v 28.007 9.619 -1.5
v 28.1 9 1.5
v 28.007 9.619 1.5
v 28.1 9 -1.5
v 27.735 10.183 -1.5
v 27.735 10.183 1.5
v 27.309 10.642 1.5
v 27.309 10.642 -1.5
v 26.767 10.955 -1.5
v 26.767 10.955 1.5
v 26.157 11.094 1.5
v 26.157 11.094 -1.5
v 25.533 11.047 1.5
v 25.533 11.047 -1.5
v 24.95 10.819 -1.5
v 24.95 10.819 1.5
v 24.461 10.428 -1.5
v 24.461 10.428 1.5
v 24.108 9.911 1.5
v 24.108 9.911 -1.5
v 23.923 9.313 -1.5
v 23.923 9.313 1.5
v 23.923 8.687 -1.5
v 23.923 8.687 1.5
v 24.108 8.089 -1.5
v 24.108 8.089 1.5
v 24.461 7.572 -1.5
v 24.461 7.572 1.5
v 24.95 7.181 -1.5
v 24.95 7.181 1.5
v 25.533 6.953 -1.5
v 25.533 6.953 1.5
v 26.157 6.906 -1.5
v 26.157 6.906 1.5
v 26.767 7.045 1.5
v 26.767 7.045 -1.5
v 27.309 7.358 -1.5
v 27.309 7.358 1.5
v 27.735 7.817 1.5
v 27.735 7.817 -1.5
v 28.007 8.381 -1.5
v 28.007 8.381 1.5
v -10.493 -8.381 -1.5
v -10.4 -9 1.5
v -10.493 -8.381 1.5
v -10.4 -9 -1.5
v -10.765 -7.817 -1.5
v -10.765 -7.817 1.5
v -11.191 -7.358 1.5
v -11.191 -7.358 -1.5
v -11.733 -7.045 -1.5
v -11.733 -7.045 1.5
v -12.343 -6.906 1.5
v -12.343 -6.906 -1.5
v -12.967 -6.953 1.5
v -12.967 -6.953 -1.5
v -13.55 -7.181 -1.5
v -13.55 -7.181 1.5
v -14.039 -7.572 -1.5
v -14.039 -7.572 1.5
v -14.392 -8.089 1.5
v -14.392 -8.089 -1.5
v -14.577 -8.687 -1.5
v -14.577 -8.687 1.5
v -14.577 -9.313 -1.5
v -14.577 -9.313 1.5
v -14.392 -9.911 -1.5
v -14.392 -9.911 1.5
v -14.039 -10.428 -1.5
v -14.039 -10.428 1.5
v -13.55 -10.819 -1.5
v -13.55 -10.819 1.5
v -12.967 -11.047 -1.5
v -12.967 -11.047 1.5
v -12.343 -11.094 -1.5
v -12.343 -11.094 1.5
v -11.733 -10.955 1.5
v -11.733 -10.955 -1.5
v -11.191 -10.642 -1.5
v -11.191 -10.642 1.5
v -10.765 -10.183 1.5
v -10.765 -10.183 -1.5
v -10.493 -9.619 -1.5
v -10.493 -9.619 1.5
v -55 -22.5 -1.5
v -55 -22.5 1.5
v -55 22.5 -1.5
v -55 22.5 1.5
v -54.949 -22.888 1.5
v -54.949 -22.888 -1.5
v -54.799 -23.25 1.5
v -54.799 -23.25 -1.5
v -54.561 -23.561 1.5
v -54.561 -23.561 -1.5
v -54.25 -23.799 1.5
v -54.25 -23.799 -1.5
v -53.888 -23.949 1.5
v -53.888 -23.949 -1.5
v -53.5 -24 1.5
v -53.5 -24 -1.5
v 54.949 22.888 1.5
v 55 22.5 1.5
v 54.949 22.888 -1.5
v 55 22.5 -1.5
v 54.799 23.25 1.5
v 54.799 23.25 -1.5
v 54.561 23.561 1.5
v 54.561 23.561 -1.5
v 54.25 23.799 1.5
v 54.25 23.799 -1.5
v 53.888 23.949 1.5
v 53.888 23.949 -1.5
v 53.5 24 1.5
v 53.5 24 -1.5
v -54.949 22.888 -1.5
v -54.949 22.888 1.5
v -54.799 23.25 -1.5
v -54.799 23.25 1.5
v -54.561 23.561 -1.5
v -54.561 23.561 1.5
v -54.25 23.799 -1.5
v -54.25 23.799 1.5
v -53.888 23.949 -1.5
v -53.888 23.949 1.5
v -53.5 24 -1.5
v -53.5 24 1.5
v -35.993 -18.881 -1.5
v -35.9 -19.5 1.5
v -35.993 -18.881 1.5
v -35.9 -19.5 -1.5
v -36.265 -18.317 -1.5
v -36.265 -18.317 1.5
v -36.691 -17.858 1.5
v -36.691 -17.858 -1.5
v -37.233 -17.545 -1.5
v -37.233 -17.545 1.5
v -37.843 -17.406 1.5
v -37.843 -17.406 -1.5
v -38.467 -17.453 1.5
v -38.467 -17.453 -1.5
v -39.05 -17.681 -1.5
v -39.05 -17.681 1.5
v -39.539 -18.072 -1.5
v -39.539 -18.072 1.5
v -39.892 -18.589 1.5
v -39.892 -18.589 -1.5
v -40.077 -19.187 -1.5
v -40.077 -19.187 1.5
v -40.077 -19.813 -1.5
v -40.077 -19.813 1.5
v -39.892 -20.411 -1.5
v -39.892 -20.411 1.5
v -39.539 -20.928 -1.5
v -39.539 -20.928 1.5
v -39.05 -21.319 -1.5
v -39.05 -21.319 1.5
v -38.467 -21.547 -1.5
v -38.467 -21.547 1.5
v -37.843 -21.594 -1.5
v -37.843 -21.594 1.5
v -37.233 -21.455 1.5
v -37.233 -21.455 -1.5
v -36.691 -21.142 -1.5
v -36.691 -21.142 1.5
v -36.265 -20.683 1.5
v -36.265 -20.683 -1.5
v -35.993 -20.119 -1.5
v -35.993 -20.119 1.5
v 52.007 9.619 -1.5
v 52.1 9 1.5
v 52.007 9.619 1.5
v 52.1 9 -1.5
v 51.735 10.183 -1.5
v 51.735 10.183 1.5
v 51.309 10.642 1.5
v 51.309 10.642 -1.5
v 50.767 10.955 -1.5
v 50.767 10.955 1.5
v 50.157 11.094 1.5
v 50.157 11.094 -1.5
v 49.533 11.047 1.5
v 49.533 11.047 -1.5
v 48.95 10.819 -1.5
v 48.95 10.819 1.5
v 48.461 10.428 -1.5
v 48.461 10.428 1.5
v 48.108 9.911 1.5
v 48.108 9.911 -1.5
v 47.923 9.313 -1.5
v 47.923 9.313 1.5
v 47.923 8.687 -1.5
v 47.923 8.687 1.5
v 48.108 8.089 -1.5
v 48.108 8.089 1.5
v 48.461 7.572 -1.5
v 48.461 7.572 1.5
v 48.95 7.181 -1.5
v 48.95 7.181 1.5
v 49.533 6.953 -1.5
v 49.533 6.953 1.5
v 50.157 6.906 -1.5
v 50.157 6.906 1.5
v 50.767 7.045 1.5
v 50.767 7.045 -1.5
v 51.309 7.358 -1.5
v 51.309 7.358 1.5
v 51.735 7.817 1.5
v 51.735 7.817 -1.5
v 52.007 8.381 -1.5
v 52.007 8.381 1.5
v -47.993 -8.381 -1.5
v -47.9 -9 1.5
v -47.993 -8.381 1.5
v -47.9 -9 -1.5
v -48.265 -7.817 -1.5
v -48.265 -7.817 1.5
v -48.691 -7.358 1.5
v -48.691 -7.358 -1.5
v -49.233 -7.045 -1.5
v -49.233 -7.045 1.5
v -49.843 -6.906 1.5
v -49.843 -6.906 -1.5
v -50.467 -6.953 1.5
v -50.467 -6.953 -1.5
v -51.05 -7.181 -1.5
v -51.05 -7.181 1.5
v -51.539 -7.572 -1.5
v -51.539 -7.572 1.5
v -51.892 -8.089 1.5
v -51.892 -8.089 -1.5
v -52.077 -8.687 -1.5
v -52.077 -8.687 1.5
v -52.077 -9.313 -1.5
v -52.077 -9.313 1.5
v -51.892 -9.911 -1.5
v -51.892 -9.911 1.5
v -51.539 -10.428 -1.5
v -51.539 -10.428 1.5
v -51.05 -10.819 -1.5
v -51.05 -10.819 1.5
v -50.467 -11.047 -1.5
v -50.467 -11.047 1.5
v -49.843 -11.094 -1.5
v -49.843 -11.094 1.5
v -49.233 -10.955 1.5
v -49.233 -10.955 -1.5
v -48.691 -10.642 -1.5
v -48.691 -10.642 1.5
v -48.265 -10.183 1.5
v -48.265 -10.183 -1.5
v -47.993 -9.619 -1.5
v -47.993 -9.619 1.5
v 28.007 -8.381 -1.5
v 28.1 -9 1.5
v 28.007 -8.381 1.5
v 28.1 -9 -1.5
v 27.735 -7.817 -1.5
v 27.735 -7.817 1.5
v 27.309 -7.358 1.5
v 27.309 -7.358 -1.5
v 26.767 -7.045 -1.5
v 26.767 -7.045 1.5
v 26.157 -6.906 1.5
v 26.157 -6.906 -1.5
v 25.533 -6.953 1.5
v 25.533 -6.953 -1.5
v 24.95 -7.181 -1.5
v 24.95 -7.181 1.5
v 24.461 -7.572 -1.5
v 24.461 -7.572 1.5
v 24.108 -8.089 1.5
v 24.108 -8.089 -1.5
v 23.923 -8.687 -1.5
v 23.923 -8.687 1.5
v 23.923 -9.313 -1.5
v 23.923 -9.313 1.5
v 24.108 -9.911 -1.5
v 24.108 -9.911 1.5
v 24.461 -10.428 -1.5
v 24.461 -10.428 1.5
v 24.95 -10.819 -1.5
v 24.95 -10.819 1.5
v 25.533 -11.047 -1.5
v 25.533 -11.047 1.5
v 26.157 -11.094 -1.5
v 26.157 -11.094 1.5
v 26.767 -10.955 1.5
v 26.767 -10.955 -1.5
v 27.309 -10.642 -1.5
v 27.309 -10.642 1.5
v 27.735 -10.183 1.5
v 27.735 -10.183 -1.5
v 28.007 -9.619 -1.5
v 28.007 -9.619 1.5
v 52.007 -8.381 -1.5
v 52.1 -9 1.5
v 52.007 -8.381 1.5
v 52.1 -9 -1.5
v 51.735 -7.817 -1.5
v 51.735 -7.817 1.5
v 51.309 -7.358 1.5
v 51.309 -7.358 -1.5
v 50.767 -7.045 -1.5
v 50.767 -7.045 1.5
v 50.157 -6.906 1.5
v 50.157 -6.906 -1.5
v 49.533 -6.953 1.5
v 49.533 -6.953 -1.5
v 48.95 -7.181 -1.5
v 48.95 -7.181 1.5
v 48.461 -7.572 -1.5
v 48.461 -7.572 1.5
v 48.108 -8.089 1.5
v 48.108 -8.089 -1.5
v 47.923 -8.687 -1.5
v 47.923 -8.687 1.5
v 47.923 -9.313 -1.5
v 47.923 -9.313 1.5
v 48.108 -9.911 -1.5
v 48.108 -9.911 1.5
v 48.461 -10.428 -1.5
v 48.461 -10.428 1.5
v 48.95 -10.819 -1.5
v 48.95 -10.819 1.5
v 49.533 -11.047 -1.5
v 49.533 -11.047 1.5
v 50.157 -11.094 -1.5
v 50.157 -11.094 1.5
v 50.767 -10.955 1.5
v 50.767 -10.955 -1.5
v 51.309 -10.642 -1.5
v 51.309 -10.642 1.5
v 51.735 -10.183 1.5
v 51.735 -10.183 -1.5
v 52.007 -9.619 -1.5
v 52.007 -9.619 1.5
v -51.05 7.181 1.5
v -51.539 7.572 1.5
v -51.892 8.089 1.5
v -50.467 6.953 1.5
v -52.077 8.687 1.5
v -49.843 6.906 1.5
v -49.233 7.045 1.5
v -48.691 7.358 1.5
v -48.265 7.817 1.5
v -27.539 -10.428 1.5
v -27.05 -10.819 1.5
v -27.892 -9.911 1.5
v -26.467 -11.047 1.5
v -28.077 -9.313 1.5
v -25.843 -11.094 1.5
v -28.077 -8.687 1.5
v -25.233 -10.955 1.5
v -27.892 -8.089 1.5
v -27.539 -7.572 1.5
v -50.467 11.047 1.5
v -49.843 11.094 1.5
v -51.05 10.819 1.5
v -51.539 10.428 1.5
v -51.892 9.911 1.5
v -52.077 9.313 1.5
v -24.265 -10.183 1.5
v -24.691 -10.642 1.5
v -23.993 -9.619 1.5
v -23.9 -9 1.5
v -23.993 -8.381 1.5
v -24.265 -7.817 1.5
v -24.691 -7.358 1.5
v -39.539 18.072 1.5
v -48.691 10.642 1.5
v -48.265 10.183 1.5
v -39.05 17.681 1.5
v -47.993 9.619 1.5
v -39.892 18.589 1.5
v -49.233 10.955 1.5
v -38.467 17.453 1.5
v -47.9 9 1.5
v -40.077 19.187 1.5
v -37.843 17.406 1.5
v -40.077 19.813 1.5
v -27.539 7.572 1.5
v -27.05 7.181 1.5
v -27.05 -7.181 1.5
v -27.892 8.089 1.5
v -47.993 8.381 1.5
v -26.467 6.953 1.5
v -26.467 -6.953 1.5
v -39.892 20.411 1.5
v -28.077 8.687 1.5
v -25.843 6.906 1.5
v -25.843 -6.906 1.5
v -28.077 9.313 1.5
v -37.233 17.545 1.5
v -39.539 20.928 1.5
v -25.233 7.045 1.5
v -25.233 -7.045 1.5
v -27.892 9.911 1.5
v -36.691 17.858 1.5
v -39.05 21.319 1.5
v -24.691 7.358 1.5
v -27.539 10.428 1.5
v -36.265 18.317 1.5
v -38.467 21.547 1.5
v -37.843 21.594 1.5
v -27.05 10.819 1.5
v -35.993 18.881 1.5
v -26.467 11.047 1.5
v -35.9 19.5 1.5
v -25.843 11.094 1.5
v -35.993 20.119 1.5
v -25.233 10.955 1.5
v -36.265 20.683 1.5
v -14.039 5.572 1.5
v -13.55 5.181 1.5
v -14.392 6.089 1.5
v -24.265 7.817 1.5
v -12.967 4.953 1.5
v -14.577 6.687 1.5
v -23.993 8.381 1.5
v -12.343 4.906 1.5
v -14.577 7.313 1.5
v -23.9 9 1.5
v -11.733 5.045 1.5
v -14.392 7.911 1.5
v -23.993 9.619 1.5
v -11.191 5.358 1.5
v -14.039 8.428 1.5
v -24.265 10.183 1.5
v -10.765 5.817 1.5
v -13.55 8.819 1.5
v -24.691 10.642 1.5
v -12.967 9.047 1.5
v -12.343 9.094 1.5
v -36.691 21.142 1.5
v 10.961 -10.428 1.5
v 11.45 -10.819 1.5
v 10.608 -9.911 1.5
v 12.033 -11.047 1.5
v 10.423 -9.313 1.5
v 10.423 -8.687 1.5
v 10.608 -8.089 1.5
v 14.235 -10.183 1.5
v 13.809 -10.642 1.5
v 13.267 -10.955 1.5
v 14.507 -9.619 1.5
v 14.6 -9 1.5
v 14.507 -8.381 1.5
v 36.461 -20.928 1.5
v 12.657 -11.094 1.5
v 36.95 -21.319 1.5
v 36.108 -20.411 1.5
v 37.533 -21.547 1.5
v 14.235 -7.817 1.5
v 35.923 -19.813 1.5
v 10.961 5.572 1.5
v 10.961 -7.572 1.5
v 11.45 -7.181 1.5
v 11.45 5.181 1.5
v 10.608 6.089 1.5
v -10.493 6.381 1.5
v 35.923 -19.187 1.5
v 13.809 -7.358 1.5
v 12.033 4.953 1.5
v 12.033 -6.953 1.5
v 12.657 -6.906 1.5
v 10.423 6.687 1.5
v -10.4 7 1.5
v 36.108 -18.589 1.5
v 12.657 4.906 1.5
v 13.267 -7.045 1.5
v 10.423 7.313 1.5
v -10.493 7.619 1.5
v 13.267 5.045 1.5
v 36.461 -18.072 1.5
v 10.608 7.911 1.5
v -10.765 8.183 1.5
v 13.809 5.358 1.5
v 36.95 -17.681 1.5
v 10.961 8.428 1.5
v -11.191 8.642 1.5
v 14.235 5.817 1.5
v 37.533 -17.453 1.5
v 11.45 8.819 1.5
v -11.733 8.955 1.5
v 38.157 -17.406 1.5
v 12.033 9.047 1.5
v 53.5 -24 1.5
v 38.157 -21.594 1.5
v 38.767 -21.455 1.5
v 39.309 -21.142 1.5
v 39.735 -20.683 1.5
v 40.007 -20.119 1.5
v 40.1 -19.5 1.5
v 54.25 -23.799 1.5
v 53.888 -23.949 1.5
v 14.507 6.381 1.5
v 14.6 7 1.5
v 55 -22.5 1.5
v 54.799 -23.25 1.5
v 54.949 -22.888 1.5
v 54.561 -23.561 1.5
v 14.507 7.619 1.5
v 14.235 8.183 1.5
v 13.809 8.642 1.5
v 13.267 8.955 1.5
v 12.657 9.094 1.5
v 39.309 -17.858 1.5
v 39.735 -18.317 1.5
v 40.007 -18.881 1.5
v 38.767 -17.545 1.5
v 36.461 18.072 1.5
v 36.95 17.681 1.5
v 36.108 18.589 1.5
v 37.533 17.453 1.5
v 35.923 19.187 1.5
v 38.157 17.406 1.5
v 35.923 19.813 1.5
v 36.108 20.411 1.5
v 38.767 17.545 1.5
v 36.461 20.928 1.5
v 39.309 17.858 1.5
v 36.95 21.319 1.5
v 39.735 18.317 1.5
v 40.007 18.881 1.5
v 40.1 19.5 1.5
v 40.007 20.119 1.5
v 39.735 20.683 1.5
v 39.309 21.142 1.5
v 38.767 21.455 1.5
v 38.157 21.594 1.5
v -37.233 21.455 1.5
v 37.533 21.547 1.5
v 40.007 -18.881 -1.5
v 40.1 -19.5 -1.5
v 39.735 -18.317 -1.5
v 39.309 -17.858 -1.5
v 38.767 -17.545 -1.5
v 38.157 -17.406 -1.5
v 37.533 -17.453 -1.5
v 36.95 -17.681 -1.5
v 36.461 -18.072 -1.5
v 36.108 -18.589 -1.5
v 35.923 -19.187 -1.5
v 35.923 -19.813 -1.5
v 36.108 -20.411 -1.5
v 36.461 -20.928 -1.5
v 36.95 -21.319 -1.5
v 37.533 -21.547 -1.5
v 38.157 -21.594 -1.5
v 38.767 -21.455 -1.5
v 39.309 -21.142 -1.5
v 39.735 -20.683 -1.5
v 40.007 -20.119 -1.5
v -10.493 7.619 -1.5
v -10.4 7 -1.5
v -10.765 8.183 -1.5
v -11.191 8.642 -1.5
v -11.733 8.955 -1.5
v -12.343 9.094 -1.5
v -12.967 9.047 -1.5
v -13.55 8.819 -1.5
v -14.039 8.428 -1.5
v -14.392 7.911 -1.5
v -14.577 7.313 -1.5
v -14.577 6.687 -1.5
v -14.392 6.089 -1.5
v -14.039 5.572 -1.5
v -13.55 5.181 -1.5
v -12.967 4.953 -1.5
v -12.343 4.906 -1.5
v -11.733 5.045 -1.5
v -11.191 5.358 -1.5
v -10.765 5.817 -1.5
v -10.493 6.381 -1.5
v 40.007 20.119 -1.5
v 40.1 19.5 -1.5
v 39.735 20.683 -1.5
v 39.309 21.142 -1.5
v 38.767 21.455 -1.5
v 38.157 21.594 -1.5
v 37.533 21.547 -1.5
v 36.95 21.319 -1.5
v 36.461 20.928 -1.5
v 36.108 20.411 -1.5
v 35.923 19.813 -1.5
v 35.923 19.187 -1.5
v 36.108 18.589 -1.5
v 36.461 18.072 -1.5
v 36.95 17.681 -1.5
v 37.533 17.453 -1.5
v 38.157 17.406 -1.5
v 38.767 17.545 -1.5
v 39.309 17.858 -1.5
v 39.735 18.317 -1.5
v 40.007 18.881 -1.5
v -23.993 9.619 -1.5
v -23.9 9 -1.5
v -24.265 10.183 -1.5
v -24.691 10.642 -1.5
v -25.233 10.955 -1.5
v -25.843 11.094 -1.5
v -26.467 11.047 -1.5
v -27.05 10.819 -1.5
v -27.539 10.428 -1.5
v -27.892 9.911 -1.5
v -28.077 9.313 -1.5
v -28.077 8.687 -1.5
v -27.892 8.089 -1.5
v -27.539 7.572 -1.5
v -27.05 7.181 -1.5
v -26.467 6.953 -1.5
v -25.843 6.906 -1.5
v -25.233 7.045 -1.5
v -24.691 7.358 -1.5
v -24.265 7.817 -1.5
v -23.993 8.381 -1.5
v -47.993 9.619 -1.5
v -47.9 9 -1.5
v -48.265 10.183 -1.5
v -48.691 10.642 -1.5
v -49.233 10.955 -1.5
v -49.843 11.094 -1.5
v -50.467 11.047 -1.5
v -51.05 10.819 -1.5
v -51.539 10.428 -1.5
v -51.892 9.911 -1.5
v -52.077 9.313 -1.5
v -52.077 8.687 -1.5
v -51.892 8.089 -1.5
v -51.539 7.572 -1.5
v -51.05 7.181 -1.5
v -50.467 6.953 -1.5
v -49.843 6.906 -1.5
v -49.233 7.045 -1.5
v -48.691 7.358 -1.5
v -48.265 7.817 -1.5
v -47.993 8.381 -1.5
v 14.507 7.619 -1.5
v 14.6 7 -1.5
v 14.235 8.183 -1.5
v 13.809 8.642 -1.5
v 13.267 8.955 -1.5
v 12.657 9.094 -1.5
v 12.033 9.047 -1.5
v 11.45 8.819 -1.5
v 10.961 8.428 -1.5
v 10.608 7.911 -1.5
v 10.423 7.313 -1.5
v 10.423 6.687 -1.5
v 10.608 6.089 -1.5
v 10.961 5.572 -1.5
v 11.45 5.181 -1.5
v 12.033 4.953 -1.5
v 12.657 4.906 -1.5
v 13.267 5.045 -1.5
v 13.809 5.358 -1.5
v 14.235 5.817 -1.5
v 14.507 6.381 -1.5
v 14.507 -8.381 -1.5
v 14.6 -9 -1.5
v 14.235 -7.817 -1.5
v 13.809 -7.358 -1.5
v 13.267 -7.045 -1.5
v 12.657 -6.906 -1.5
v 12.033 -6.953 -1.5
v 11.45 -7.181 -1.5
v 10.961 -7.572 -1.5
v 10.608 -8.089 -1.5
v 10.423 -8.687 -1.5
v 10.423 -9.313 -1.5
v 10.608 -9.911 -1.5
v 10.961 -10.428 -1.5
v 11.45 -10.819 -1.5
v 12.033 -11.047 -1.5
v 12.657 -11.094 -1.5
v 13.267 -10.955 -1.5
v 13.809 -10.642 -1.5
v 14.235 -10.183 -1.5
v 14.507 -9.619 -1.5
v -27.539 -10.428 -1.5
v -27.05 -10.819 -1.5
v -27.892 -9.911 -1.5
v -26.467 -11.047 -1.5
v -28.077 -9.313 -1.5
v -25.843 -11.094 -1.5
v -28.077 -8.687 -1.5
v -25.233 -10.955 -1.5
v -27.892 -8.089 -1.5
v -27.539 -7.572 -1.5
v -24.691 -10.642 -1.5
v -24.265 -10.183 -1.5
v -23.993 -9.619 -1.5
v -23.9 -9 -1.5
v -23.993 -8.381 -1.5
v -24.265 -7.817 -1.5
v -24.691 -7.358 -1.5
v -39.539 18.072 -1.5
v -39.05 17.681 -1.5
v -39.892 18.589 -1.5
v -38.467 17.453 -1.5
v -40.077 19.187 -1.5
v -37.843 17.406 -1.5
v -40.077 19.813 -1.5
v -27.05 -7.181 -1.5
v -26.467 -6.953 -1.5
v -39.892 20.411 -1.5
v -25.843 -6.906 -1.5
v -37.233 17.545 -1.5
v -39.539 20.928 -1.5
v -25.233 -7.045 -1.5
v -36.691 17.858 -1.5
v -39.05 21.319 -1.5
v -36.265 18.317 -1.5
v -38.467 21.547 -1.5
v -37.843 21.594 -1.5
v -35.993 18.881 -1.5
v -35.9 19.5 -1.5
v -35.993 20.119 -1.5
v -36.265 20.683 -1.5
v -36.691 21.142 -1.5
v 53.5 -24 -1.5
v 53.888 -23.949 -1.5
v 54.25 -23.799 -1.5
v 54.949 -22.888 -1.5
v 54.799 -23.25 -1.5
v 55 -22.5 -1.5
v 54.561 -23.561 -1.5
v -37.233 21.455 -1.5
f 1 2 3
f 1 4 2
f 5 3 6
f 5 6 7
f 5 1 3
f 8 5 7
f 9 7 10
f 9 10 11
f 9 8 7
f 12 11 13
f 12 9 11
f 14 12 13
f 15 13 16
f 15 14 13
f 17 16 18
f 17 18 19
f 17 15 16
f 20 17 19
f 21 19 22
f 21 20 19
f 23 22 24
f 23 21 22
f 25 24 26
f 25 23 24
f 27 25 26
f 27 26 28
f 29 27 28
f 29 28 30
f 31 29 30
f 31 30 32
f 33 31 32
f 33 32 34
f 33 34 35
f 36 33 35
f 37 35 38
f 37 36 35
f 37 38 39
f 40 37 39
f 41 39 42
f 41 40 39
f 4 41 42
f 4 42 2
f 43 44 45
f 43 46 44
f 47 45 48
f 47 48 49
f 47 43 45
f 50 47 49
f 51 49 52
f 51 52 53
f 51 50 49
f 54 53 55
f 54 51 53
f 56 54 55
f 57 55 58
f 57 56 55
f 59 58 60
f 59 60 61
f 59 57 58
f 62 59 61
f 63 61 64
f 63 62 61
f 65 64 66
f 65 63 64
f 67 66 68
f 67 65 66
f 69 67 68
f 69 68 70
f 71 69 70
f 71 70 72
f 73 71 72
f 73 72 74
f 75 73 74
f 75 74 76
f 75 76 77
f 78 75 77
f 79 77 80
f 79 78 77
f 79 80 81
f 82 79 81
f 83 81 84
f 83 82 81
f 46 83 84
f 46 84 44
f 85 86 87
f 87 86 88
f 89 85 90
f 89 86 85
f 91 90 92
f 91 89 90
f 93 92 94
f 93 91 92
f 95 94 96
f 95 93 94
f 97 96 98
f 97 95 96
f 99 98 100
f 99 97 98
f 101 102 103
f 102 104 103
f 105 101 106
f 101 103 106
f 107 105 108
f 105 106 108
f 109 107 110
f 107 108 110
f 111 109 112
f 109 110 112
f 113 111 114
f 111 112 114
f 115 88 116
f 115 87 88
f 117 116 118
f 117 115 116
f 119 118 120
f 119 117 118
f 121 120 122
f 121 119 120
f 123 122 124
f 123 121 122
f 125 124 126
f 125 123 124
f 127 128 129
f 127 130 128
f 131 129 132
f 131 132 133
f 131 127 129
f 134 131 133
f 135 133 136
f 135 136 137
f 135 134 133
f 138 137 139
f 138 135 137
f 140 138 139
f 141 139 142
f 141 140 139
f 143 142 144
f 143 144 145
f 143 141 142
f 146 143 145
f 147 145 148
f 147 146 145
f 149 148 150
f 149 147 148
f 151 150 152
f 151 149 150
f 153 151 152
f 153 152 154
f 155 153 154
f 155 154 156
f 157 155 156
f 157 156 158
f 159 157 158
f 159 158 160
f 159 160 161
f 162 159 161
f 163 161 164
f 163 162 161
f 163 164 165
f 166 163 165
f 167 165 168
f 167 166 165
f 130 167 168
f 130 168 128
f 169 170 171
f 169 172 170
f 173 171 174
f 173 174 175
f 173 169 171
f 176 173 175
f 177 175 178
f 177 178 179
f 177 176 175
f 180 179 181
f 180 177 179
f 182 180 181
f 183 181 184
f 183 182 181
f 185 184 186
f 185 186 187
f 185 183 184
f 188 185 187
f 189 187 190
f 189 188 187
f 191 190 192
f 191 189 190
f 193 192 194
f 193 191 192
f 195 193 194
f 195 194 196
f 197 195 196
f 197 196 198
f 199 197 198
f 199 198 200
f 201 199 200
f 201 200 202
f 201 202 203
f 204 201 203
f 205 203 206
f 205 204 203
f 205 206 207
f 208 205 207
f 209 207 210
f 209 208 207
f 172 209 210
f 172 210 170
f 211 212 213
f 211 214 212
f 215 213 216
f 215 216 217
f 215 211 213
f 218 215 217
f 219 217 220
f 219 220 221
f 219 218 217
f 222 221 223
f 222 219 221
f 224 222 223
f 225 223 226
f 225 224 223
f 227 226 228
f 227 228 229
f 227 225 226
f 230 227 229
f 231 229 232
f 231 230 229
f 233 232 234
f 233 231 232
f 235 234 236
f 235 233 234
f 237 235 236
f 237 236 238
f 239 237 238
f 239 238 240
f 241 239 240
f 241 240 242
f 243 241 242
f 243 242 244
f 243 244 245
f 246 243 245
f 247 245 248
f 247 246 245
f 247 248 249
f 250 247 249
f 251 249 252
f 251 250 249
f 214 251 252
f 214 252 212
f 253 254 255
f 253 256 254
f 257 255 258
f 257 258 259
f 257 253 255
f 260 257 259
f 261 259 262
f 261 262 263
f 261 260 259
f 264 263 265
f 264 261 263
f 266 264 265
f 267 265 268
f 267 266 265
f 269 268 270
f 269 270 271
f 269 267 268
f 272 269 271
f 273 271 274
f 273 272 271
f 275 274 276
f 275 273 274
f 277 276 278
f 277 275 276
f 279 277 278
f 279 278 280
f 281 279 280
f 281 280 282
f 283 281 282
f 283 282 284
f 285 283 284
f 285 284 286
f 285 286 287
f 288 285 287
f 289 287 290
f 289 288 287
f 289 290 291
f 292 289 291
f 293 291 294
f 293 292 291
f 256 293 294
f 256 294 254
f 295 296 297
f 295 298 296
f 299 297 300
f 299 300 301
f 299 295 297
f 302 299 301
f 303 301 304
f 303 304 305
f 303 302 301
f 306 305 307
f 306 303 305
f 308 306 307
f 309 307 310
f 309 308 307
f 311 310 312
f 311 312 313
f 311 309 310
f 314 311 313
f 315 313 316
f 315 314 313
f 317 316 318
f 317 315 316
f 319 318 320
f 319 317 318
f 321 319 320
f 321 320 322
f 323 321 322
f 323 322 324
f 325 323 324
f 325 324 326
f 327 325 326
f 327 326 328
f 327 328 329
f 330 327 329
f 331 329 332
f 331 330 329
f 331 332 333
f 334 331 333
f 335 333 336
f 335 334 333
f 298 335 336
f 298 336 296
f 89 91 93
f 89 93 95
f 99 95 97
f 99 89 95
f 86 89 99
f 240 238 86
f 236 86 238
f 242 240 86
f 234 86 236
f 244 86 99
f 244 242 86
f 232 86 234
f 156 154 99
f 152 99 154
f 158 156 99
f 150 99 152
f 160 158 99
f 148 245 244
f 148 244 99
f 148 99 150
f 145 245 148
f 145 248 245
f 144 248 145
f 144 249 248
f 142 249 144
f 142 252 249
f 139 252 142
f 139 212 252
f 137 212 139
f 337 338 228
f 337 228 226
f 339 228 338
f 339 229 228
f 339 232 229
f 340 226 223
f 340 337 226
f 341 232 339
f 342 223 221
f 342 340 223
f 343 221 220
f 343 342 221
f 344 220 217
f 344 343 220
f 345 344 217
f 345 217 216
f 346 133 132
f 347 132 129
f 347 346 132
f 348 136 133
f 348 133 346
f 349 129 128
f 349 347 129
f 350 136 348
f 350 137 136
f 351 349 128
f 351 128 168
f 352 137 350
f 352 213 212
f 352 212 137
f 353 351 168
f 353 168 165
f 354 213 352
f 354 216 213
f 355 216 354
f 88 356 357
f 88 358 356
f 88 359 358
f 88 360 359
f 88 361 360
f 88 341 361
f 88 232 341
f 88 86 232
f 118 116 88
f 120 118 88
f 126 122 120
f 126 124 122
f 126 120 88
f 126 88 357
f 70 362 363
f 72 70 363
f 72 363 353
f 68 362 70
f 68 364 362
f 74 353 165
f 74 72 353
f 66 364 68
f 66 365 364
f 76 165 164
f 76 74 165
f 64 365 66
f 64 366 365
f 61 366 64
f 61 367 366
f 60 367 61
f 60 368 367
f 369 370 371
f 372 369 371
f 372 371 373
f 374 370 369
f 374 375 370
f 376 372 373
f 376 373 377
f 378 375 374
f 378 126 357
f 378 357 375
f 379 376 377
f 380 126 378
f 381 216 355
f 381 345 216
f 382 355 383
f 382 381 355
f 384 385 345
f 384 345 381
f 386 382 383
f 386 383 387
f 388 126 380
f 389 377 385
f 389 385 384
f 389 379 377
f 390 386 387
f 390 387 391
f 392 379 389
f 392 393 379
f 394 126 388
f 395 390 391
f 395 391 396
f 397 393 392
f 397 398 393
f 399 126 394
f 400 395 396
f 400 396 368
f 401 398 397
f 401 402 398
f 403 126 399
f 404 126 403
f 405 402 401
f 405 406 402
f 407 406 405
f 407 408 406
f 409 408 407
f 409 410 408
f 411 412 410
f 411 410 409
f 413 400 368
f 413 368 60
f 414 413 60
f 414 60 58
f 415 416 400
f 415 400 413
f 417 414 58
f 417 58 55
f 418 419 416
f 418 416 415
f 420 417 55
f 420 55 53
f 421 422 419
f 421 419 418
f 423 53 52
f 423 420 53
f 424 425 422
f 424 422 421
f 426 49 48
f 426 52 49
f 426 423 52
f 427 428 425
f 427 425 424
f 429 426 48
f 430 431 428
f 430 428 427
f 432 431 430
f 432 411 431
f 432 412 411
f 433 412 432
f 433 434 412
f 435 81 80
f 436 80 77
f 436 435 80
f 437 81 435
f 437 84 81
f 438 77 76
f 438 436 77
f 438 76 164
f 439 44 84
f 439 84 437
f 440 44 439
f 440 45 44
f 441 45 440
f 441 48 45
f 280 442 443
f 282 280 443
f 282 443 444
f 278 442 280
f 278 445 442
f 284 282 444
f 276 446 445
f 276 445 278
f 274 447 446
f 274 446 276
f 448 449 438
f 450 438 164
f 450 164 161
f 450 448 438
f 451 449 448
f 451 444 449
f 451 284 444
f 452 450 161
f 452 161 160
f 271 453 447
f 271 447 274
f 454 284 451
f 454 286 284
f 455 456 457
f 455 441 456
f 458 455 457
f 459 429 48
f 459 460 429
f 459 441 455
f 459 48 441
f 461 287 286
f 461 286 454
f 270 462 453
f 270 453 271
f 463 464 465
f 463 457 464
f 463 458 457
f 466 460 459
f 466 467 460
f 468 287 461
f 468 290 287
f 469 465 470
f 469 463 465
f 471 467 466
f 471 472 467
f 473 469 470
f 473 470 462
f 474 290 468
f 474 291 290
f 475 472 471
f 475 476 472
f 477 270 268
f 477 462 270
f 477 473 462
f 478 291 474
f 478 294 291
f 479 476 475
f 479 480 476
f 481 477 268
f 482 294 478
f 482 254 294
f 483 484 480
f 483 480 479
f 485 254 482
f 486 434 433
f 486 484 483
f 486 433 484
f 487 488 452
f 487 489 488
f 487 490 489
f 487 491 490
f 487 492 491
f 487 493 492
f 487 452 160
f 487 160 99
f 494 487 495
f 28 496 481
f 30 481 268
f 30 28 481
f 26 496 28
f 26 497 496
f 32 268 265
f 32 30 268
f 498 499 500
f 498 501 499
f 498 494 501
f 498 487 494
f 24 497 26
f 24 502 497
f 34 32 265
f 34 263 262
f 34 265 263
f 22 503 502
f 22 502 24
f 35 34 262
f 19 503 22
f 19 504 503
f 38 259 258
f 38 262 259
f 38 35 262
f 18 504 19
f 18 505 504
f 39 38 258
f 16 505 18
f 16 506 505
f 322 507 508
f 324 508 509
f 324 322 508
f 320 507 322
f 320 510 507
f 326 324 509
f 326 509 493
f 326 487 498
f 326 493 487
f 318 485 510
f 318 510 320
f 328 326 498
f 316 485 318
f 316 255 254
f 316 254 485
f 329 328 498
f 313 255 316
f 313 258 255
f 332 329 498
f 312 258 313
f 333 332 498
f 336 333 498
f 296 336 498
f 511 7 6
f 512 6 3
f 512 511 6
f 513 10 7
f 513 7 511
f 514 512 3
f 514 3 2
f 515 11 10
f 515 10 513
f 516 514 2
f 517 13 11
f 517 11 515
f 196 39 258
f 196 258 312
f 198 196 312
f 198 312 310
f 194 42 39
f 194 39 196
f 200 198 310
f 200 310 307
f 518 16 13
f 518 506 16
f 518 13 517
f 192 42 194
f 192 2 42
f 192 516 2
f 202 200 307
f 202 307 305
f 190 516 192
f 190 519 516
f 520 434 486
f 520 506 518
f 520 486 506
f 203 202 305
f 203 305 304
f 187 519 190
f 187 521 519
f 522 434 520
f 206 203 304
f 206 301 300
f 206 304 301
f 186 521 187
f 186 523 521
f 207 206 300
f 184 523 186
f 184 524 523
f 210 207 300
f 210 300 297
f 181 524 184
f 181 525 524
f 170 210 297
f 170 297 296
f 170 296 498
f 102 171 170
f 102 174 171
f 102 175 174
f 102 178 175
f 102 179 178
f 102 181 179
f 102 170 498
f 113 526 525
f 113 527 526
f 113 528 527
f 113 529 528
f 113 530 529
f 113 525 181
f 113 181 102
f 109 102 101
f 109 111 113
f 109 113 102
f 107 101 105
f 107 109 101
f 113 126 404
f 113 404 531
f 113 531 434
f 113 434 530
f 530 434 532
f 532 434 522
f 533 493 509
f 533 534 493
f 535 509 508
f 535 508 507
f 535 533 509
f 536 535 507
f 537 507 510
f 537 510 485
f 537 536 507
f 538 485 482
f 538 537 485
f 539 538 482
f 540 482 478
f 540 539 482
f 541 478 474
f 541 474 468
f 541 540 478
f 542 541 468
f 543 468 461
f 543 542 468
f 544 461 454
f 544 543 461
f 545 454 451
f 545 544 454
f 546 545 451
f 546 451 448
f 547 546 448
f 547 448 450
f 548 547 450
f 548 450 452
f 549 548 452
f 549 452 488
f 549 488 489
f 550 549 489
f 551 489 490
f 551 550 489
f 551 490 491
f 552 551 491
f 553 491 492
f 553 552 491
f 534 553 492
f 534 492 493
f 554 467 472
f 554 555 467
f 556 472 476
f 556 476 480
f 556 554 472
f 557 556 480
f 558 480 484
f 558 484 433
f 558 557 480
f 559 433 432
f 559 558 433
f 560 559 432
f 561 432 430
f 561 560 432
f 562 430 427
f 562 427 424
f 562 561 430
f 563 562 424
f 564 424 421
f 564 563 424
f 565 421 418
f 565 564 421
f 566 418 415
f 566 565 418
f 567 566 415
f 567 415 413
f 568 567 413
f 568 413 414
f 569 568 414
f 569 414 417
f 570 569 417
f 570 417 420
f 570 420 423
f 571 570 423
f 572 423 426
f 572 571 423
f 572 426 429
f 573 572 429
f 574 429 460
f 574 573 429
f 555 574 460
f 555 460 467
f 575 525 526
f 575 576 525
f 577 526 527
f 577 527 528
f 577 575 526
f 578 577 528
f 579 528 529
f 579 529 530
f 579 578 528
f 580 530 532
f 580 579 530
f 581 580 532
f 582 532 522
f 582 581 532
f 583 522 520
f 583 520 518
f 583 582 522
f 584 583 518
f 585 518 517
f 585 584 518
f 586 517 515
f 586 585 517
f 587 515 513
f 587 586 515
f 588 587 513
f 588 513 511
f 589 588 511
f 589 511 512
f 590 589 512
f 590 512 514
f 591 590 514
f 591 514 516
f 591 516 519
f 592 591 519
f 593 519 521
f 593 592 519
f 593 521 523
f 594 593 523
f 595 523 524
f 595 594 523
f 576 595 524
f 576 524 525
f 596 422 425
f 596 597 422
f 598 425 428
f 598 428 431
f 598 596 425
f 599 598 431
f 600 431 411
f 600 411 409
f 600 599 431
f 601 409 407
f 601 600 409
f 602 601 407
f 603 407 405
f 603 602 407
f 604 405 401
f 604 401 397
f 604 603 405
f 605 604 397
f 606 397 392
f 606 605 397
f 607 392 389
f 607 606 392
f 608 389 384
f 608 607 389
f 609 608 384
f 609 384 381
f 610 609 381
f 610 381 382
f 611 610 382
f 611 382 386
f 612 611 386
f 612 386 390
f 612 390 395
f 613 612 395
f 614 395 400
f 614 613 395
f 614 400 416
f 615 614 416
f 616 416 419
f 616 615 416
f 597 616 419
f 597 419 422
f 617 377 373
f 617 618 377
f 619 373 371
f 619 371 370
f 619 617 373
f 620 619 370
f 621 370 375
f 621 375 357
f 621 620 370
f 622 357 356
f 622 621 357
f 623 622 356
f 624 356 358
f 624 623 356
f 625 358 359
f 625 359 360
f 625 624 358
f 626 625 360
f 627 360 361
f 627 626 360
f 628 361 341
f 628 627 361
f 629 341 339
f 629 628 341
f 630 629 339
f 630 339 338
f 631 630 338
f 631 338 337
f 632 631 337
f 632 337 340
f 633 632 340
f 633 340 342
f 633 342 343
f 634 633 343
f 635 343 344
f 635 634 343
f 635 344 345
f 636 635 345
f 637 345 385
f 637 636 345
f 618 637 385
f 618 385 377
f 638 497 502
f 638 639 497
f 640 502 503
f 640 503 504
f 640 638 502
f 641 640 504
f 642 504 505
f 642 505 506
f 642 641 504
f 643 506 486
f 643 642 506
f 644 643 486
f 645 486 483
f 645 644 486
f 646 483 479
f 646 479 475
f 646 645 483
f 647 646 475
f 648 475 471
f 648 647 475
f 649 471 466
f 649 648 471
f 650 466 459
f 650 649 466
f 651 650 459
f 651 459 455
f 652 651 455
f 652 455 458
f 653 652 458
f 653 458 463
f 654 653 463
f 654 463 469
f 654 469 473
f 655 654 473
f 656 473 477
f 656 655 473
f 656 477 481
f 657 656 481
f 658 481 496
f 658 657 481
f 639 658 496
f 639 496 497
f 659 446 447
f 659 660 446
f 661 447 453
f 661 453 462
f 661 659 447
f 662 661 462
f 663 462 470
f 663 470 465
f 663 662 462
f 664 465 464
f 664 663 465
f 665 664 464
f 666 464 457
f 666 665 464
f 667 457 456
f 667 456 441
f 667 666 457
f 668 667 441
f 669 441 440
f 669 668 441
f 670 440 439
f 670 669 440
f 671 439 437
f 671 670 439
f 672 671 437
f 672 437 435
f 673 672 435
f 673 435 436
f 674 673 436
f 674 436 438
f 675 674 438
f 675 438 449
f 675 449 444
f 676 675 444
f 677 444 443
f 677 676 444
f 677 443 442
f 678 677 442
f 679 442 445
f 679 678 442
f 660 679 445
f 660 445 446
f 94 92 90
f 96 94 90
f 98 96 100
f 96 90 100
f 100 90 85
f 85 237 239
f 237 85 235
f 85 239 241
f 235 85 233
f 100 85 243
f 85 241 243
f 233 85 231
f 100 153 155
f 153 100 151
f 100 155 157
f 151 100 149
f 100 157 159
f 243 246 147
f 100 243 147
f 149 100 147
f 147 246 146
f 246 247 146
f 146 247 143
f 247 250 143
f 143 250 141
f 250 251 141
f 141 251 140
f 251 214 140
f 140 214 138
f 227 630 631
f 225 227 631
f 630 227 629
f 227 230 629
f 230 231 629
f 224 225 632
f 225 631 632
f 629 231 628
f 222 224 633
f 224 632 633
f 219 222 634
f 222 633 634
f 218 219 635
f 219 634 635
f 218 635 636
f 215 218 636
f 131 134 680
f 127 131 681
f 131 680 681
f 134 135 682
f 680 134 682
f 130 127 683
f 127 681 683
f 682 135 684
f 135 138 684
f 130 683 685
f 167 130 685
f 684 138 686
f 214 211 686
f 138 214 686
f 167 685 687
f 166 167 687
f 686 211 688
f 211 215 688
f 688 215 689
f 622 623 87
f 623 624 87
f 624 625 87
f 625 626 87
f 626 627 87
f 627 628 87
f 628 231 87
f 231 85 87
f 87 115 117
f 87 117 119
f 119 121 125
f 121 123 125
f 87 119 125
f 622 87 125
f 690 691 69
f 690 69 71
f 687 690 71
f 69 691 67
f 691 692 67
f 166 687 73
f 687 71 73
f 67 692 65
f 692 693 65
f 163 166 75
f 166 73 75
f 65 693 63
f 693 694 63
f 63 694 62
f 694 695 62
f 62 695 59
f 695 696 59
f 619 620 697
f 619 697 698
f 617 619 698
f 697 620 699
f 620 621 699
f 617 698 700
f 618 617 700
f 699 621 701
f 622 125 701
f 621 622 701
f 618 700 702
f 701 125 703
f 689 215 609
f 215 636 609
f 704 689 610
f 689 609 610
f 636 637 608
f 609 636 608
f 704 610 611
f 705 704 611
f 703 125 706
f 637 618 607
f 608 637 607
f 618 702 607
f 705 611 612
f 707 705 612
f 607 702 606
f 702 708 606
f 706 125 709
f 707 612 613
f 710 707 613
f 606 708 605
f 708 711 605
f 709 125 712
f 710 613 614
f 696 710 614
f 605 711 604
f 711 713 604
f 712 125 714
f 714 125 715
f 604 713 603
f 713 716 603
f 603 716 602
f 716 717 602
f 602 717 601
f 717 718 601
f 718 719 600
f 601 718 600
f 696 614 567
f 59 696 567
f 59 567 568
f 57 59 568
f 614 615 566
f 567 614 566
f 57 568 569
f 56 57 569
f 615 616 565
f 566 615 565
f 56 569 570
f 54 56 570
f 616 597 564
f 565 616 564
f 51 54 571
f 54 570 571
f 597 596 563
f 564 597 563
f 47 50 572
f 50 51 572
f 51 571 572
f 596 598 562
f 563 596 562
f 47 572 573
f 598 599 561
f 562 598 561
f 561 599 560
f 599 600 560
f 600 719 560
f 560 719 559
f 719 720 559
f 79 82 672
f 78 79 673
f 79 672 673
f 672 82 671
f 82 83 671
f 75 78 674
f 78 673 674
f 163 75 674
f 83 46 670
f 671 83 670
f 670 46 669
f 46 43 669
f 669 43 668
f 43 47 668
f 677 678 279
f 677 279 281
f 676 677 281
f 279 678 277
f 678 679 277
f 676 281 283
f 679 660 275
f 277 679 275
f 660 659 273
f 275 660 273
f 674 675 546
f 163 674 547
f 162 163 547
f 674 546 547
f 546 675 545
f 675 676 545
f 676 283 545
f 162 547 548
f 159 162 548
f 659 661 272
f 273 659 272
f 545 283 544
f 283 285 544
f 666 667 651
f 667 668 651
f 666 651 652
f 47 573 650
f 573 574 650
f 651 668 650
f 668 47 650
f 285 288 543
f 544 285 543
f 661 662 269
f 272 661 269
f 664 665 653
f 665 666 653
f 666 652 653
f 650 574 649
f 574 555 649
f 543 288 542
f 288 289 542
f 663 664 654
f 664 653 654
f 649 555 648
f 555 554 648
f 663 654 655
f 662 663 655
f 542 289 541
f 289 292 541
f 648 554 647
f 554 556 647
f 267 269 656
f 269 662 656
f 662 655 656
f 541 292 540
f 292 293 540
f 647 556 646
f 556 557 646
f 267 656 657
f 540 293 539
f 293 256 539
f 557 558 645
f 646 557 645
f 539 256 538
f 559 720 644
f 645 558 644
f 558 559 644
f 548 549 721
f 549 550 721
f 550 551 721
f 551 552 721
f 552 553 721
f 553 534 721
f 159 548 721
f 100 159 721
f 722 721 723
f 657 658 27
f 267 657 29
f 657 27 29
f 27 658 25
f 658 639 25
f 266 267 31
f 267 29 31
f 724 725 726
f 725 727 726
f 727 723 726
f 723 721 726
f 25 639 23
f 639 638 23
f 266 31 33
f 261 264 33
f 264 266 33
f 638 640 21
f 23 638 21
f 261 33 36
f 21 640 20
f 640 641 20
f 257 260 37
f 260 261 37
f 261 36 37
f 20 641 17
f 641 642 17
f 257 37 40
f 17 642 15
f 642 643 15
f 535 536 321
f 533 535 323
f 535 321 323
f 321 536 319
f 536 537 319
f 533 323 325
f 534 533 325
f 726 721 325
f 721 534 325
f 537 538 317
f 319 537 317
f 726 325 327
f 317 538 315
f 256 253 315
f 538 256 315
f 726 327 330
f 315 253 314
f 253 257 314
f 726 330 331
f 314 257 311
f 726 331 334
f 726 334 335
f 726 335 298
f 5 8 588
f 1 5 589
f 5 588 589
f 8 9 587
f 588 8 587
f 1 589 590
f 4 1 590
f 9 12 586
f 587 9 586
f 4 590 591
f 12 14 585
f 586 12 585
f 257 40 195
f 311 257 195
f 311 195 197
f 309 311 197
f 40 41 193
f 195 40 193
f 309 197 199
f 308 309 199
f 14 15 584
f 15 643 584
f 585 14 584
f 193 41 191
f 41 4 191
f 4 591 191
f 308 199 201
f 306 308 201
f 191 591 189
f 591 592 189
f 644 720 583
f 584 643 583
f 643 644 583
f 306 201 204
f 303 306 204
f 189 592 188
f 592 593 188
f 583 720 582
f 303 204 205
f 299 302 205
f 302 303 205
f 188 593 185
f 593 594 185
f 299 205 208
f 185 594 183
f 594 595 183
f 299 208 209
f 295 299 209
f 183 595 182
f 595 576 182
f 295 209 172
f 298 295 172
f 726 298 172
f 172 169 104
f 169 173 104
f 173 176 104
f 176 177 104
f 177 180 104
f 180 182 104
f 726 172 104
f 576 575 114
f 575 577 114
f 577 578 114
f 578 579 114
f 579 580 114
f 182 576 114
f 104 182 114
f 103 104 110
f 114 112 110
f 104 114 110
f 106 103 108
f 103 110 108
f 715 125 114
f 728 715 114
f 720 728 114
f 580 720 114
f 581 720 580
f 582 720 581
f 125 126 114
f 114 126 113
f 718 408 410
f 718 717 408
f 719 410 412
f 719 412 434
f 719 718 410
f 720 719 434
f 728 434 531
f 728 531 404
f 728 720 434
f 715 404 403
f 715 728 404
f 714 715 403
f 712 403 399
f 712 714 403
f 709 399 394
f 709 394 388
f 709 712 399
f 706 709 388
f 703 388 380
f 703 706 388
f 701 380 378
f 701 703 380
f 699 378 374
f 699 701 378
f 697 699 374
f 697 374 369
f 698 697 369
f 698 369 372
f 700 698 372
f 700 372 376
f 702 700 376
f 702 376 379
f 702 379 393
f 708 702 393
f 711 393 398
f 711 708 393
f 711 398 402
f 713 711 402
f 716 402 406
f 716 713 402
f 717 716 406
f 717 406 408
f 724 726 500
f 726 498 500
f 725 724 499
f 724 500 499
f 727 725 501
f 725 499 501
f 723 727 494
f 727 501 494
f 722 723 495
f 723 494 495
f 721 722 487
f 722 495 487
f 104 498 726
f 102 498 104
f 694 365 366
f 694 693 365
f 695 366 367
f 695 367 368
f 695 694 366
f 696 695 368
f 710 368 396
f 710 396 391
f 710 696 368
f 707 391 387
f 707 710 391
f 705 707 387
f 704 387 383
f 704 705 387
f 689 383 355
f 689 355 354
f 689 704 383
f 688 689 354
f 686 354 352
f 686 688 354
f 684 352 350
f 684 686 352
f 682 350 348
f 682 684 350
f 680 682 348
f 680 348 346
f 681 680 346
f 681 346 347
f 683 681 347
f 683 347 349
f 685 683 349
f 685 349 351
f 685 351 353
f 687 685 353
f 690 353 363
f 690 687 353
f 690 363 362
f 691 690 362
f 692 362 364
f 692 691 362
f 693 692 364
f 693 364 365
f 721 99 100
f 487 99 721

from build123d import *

# Parameters (mm, degrees)
SKETCH1_W           = 110
SKETCH1_H           = 48
SKETCH1_R           = 2.1
BOSS_EXTRUDE1_DEPTH = 1.5
FILLET1_R           = 1.5


with BuildPart() as part:
    # Sketch1 → Boss-Extrude1 (new body, symmetric)
    with BuildSketch(Plane.XY):
        Rectangle(SKETCH1_W, SKETCH1_H)
        with Locations((50, 9)):
            Circle(SKETCH1_R, mode=Mode.SUBTRACT)
        with Locations((26, 9)):
            Circle(SKETCH1_R, mode=Mode.SUBTRACT)
        with Locations((50, -9)):
            Circle(SKETCH1_R, mode=Mode.SUBTRACT)
        with Locations((26, -9)):
            Circle(SKETCH1_R, mode=Mode.SUBTRACT)
        with Locations((-50, 9)):
            Circle(SKETCH1_R, mode=Mode.SUBTRACT)
        with Locations((-26, 9)):
            Circle(SKETCH1_R, mode=Mode.SUBTRACT)
        with Locations((-50, -9)):
            Circle(SKETCH1_R, mode=Mode.SUBTRACT)
        with Locations((-26, -9)):
            Circle(SKETCH1_R, mode=Mode.SUBTRACT)
        with Locations((-38, 19.5)):
            Circle(SKETCH1_R, mode=Mode.SUBTRACT)
        with Locations((-38, -19.5)):
            Circle(SKETCH1_R, mode=Mode.SUBTRACT)
        with Locations((38, 19.5)):
            Circle(SKETCH1_R, mode=Mode.SUBTRACT)
        with Locations((38, -19.5)):
            Circle(SKETCH1_R, mode=Mode.SUBTRACT)
        with Locations((12.5, -9)):
            Circle(SKETCH1_R, mode=Mode.SUBTRACT)
        with Locations((-12.5, -9)):
            Circle(SKETCH1_R, mode=Mode.SUBTRACT)
        with Locations((-12.5, 7)):
            Circle(SKETCH1_R, mode=Mode.SUBTRACT)
        with Locations((12.5, 7)):
            Circle(SKETCH1_R, mode=Mode.SUBTRACT)
    extrude(amount=BOSS_EXTRUDE1_DEPTH, both=True)

    # Fillet1
    fillet1_edges = [part.edges().sort_by_distance(p)[0] for p in [
        (-55, 24, 0),
        (55, 24, 0),
        (55, -24, 0),
        (-55, -24, 0),
    ]]
    fillet(fillet1_edges, radius=FILLET1_R)


solid = part.part
